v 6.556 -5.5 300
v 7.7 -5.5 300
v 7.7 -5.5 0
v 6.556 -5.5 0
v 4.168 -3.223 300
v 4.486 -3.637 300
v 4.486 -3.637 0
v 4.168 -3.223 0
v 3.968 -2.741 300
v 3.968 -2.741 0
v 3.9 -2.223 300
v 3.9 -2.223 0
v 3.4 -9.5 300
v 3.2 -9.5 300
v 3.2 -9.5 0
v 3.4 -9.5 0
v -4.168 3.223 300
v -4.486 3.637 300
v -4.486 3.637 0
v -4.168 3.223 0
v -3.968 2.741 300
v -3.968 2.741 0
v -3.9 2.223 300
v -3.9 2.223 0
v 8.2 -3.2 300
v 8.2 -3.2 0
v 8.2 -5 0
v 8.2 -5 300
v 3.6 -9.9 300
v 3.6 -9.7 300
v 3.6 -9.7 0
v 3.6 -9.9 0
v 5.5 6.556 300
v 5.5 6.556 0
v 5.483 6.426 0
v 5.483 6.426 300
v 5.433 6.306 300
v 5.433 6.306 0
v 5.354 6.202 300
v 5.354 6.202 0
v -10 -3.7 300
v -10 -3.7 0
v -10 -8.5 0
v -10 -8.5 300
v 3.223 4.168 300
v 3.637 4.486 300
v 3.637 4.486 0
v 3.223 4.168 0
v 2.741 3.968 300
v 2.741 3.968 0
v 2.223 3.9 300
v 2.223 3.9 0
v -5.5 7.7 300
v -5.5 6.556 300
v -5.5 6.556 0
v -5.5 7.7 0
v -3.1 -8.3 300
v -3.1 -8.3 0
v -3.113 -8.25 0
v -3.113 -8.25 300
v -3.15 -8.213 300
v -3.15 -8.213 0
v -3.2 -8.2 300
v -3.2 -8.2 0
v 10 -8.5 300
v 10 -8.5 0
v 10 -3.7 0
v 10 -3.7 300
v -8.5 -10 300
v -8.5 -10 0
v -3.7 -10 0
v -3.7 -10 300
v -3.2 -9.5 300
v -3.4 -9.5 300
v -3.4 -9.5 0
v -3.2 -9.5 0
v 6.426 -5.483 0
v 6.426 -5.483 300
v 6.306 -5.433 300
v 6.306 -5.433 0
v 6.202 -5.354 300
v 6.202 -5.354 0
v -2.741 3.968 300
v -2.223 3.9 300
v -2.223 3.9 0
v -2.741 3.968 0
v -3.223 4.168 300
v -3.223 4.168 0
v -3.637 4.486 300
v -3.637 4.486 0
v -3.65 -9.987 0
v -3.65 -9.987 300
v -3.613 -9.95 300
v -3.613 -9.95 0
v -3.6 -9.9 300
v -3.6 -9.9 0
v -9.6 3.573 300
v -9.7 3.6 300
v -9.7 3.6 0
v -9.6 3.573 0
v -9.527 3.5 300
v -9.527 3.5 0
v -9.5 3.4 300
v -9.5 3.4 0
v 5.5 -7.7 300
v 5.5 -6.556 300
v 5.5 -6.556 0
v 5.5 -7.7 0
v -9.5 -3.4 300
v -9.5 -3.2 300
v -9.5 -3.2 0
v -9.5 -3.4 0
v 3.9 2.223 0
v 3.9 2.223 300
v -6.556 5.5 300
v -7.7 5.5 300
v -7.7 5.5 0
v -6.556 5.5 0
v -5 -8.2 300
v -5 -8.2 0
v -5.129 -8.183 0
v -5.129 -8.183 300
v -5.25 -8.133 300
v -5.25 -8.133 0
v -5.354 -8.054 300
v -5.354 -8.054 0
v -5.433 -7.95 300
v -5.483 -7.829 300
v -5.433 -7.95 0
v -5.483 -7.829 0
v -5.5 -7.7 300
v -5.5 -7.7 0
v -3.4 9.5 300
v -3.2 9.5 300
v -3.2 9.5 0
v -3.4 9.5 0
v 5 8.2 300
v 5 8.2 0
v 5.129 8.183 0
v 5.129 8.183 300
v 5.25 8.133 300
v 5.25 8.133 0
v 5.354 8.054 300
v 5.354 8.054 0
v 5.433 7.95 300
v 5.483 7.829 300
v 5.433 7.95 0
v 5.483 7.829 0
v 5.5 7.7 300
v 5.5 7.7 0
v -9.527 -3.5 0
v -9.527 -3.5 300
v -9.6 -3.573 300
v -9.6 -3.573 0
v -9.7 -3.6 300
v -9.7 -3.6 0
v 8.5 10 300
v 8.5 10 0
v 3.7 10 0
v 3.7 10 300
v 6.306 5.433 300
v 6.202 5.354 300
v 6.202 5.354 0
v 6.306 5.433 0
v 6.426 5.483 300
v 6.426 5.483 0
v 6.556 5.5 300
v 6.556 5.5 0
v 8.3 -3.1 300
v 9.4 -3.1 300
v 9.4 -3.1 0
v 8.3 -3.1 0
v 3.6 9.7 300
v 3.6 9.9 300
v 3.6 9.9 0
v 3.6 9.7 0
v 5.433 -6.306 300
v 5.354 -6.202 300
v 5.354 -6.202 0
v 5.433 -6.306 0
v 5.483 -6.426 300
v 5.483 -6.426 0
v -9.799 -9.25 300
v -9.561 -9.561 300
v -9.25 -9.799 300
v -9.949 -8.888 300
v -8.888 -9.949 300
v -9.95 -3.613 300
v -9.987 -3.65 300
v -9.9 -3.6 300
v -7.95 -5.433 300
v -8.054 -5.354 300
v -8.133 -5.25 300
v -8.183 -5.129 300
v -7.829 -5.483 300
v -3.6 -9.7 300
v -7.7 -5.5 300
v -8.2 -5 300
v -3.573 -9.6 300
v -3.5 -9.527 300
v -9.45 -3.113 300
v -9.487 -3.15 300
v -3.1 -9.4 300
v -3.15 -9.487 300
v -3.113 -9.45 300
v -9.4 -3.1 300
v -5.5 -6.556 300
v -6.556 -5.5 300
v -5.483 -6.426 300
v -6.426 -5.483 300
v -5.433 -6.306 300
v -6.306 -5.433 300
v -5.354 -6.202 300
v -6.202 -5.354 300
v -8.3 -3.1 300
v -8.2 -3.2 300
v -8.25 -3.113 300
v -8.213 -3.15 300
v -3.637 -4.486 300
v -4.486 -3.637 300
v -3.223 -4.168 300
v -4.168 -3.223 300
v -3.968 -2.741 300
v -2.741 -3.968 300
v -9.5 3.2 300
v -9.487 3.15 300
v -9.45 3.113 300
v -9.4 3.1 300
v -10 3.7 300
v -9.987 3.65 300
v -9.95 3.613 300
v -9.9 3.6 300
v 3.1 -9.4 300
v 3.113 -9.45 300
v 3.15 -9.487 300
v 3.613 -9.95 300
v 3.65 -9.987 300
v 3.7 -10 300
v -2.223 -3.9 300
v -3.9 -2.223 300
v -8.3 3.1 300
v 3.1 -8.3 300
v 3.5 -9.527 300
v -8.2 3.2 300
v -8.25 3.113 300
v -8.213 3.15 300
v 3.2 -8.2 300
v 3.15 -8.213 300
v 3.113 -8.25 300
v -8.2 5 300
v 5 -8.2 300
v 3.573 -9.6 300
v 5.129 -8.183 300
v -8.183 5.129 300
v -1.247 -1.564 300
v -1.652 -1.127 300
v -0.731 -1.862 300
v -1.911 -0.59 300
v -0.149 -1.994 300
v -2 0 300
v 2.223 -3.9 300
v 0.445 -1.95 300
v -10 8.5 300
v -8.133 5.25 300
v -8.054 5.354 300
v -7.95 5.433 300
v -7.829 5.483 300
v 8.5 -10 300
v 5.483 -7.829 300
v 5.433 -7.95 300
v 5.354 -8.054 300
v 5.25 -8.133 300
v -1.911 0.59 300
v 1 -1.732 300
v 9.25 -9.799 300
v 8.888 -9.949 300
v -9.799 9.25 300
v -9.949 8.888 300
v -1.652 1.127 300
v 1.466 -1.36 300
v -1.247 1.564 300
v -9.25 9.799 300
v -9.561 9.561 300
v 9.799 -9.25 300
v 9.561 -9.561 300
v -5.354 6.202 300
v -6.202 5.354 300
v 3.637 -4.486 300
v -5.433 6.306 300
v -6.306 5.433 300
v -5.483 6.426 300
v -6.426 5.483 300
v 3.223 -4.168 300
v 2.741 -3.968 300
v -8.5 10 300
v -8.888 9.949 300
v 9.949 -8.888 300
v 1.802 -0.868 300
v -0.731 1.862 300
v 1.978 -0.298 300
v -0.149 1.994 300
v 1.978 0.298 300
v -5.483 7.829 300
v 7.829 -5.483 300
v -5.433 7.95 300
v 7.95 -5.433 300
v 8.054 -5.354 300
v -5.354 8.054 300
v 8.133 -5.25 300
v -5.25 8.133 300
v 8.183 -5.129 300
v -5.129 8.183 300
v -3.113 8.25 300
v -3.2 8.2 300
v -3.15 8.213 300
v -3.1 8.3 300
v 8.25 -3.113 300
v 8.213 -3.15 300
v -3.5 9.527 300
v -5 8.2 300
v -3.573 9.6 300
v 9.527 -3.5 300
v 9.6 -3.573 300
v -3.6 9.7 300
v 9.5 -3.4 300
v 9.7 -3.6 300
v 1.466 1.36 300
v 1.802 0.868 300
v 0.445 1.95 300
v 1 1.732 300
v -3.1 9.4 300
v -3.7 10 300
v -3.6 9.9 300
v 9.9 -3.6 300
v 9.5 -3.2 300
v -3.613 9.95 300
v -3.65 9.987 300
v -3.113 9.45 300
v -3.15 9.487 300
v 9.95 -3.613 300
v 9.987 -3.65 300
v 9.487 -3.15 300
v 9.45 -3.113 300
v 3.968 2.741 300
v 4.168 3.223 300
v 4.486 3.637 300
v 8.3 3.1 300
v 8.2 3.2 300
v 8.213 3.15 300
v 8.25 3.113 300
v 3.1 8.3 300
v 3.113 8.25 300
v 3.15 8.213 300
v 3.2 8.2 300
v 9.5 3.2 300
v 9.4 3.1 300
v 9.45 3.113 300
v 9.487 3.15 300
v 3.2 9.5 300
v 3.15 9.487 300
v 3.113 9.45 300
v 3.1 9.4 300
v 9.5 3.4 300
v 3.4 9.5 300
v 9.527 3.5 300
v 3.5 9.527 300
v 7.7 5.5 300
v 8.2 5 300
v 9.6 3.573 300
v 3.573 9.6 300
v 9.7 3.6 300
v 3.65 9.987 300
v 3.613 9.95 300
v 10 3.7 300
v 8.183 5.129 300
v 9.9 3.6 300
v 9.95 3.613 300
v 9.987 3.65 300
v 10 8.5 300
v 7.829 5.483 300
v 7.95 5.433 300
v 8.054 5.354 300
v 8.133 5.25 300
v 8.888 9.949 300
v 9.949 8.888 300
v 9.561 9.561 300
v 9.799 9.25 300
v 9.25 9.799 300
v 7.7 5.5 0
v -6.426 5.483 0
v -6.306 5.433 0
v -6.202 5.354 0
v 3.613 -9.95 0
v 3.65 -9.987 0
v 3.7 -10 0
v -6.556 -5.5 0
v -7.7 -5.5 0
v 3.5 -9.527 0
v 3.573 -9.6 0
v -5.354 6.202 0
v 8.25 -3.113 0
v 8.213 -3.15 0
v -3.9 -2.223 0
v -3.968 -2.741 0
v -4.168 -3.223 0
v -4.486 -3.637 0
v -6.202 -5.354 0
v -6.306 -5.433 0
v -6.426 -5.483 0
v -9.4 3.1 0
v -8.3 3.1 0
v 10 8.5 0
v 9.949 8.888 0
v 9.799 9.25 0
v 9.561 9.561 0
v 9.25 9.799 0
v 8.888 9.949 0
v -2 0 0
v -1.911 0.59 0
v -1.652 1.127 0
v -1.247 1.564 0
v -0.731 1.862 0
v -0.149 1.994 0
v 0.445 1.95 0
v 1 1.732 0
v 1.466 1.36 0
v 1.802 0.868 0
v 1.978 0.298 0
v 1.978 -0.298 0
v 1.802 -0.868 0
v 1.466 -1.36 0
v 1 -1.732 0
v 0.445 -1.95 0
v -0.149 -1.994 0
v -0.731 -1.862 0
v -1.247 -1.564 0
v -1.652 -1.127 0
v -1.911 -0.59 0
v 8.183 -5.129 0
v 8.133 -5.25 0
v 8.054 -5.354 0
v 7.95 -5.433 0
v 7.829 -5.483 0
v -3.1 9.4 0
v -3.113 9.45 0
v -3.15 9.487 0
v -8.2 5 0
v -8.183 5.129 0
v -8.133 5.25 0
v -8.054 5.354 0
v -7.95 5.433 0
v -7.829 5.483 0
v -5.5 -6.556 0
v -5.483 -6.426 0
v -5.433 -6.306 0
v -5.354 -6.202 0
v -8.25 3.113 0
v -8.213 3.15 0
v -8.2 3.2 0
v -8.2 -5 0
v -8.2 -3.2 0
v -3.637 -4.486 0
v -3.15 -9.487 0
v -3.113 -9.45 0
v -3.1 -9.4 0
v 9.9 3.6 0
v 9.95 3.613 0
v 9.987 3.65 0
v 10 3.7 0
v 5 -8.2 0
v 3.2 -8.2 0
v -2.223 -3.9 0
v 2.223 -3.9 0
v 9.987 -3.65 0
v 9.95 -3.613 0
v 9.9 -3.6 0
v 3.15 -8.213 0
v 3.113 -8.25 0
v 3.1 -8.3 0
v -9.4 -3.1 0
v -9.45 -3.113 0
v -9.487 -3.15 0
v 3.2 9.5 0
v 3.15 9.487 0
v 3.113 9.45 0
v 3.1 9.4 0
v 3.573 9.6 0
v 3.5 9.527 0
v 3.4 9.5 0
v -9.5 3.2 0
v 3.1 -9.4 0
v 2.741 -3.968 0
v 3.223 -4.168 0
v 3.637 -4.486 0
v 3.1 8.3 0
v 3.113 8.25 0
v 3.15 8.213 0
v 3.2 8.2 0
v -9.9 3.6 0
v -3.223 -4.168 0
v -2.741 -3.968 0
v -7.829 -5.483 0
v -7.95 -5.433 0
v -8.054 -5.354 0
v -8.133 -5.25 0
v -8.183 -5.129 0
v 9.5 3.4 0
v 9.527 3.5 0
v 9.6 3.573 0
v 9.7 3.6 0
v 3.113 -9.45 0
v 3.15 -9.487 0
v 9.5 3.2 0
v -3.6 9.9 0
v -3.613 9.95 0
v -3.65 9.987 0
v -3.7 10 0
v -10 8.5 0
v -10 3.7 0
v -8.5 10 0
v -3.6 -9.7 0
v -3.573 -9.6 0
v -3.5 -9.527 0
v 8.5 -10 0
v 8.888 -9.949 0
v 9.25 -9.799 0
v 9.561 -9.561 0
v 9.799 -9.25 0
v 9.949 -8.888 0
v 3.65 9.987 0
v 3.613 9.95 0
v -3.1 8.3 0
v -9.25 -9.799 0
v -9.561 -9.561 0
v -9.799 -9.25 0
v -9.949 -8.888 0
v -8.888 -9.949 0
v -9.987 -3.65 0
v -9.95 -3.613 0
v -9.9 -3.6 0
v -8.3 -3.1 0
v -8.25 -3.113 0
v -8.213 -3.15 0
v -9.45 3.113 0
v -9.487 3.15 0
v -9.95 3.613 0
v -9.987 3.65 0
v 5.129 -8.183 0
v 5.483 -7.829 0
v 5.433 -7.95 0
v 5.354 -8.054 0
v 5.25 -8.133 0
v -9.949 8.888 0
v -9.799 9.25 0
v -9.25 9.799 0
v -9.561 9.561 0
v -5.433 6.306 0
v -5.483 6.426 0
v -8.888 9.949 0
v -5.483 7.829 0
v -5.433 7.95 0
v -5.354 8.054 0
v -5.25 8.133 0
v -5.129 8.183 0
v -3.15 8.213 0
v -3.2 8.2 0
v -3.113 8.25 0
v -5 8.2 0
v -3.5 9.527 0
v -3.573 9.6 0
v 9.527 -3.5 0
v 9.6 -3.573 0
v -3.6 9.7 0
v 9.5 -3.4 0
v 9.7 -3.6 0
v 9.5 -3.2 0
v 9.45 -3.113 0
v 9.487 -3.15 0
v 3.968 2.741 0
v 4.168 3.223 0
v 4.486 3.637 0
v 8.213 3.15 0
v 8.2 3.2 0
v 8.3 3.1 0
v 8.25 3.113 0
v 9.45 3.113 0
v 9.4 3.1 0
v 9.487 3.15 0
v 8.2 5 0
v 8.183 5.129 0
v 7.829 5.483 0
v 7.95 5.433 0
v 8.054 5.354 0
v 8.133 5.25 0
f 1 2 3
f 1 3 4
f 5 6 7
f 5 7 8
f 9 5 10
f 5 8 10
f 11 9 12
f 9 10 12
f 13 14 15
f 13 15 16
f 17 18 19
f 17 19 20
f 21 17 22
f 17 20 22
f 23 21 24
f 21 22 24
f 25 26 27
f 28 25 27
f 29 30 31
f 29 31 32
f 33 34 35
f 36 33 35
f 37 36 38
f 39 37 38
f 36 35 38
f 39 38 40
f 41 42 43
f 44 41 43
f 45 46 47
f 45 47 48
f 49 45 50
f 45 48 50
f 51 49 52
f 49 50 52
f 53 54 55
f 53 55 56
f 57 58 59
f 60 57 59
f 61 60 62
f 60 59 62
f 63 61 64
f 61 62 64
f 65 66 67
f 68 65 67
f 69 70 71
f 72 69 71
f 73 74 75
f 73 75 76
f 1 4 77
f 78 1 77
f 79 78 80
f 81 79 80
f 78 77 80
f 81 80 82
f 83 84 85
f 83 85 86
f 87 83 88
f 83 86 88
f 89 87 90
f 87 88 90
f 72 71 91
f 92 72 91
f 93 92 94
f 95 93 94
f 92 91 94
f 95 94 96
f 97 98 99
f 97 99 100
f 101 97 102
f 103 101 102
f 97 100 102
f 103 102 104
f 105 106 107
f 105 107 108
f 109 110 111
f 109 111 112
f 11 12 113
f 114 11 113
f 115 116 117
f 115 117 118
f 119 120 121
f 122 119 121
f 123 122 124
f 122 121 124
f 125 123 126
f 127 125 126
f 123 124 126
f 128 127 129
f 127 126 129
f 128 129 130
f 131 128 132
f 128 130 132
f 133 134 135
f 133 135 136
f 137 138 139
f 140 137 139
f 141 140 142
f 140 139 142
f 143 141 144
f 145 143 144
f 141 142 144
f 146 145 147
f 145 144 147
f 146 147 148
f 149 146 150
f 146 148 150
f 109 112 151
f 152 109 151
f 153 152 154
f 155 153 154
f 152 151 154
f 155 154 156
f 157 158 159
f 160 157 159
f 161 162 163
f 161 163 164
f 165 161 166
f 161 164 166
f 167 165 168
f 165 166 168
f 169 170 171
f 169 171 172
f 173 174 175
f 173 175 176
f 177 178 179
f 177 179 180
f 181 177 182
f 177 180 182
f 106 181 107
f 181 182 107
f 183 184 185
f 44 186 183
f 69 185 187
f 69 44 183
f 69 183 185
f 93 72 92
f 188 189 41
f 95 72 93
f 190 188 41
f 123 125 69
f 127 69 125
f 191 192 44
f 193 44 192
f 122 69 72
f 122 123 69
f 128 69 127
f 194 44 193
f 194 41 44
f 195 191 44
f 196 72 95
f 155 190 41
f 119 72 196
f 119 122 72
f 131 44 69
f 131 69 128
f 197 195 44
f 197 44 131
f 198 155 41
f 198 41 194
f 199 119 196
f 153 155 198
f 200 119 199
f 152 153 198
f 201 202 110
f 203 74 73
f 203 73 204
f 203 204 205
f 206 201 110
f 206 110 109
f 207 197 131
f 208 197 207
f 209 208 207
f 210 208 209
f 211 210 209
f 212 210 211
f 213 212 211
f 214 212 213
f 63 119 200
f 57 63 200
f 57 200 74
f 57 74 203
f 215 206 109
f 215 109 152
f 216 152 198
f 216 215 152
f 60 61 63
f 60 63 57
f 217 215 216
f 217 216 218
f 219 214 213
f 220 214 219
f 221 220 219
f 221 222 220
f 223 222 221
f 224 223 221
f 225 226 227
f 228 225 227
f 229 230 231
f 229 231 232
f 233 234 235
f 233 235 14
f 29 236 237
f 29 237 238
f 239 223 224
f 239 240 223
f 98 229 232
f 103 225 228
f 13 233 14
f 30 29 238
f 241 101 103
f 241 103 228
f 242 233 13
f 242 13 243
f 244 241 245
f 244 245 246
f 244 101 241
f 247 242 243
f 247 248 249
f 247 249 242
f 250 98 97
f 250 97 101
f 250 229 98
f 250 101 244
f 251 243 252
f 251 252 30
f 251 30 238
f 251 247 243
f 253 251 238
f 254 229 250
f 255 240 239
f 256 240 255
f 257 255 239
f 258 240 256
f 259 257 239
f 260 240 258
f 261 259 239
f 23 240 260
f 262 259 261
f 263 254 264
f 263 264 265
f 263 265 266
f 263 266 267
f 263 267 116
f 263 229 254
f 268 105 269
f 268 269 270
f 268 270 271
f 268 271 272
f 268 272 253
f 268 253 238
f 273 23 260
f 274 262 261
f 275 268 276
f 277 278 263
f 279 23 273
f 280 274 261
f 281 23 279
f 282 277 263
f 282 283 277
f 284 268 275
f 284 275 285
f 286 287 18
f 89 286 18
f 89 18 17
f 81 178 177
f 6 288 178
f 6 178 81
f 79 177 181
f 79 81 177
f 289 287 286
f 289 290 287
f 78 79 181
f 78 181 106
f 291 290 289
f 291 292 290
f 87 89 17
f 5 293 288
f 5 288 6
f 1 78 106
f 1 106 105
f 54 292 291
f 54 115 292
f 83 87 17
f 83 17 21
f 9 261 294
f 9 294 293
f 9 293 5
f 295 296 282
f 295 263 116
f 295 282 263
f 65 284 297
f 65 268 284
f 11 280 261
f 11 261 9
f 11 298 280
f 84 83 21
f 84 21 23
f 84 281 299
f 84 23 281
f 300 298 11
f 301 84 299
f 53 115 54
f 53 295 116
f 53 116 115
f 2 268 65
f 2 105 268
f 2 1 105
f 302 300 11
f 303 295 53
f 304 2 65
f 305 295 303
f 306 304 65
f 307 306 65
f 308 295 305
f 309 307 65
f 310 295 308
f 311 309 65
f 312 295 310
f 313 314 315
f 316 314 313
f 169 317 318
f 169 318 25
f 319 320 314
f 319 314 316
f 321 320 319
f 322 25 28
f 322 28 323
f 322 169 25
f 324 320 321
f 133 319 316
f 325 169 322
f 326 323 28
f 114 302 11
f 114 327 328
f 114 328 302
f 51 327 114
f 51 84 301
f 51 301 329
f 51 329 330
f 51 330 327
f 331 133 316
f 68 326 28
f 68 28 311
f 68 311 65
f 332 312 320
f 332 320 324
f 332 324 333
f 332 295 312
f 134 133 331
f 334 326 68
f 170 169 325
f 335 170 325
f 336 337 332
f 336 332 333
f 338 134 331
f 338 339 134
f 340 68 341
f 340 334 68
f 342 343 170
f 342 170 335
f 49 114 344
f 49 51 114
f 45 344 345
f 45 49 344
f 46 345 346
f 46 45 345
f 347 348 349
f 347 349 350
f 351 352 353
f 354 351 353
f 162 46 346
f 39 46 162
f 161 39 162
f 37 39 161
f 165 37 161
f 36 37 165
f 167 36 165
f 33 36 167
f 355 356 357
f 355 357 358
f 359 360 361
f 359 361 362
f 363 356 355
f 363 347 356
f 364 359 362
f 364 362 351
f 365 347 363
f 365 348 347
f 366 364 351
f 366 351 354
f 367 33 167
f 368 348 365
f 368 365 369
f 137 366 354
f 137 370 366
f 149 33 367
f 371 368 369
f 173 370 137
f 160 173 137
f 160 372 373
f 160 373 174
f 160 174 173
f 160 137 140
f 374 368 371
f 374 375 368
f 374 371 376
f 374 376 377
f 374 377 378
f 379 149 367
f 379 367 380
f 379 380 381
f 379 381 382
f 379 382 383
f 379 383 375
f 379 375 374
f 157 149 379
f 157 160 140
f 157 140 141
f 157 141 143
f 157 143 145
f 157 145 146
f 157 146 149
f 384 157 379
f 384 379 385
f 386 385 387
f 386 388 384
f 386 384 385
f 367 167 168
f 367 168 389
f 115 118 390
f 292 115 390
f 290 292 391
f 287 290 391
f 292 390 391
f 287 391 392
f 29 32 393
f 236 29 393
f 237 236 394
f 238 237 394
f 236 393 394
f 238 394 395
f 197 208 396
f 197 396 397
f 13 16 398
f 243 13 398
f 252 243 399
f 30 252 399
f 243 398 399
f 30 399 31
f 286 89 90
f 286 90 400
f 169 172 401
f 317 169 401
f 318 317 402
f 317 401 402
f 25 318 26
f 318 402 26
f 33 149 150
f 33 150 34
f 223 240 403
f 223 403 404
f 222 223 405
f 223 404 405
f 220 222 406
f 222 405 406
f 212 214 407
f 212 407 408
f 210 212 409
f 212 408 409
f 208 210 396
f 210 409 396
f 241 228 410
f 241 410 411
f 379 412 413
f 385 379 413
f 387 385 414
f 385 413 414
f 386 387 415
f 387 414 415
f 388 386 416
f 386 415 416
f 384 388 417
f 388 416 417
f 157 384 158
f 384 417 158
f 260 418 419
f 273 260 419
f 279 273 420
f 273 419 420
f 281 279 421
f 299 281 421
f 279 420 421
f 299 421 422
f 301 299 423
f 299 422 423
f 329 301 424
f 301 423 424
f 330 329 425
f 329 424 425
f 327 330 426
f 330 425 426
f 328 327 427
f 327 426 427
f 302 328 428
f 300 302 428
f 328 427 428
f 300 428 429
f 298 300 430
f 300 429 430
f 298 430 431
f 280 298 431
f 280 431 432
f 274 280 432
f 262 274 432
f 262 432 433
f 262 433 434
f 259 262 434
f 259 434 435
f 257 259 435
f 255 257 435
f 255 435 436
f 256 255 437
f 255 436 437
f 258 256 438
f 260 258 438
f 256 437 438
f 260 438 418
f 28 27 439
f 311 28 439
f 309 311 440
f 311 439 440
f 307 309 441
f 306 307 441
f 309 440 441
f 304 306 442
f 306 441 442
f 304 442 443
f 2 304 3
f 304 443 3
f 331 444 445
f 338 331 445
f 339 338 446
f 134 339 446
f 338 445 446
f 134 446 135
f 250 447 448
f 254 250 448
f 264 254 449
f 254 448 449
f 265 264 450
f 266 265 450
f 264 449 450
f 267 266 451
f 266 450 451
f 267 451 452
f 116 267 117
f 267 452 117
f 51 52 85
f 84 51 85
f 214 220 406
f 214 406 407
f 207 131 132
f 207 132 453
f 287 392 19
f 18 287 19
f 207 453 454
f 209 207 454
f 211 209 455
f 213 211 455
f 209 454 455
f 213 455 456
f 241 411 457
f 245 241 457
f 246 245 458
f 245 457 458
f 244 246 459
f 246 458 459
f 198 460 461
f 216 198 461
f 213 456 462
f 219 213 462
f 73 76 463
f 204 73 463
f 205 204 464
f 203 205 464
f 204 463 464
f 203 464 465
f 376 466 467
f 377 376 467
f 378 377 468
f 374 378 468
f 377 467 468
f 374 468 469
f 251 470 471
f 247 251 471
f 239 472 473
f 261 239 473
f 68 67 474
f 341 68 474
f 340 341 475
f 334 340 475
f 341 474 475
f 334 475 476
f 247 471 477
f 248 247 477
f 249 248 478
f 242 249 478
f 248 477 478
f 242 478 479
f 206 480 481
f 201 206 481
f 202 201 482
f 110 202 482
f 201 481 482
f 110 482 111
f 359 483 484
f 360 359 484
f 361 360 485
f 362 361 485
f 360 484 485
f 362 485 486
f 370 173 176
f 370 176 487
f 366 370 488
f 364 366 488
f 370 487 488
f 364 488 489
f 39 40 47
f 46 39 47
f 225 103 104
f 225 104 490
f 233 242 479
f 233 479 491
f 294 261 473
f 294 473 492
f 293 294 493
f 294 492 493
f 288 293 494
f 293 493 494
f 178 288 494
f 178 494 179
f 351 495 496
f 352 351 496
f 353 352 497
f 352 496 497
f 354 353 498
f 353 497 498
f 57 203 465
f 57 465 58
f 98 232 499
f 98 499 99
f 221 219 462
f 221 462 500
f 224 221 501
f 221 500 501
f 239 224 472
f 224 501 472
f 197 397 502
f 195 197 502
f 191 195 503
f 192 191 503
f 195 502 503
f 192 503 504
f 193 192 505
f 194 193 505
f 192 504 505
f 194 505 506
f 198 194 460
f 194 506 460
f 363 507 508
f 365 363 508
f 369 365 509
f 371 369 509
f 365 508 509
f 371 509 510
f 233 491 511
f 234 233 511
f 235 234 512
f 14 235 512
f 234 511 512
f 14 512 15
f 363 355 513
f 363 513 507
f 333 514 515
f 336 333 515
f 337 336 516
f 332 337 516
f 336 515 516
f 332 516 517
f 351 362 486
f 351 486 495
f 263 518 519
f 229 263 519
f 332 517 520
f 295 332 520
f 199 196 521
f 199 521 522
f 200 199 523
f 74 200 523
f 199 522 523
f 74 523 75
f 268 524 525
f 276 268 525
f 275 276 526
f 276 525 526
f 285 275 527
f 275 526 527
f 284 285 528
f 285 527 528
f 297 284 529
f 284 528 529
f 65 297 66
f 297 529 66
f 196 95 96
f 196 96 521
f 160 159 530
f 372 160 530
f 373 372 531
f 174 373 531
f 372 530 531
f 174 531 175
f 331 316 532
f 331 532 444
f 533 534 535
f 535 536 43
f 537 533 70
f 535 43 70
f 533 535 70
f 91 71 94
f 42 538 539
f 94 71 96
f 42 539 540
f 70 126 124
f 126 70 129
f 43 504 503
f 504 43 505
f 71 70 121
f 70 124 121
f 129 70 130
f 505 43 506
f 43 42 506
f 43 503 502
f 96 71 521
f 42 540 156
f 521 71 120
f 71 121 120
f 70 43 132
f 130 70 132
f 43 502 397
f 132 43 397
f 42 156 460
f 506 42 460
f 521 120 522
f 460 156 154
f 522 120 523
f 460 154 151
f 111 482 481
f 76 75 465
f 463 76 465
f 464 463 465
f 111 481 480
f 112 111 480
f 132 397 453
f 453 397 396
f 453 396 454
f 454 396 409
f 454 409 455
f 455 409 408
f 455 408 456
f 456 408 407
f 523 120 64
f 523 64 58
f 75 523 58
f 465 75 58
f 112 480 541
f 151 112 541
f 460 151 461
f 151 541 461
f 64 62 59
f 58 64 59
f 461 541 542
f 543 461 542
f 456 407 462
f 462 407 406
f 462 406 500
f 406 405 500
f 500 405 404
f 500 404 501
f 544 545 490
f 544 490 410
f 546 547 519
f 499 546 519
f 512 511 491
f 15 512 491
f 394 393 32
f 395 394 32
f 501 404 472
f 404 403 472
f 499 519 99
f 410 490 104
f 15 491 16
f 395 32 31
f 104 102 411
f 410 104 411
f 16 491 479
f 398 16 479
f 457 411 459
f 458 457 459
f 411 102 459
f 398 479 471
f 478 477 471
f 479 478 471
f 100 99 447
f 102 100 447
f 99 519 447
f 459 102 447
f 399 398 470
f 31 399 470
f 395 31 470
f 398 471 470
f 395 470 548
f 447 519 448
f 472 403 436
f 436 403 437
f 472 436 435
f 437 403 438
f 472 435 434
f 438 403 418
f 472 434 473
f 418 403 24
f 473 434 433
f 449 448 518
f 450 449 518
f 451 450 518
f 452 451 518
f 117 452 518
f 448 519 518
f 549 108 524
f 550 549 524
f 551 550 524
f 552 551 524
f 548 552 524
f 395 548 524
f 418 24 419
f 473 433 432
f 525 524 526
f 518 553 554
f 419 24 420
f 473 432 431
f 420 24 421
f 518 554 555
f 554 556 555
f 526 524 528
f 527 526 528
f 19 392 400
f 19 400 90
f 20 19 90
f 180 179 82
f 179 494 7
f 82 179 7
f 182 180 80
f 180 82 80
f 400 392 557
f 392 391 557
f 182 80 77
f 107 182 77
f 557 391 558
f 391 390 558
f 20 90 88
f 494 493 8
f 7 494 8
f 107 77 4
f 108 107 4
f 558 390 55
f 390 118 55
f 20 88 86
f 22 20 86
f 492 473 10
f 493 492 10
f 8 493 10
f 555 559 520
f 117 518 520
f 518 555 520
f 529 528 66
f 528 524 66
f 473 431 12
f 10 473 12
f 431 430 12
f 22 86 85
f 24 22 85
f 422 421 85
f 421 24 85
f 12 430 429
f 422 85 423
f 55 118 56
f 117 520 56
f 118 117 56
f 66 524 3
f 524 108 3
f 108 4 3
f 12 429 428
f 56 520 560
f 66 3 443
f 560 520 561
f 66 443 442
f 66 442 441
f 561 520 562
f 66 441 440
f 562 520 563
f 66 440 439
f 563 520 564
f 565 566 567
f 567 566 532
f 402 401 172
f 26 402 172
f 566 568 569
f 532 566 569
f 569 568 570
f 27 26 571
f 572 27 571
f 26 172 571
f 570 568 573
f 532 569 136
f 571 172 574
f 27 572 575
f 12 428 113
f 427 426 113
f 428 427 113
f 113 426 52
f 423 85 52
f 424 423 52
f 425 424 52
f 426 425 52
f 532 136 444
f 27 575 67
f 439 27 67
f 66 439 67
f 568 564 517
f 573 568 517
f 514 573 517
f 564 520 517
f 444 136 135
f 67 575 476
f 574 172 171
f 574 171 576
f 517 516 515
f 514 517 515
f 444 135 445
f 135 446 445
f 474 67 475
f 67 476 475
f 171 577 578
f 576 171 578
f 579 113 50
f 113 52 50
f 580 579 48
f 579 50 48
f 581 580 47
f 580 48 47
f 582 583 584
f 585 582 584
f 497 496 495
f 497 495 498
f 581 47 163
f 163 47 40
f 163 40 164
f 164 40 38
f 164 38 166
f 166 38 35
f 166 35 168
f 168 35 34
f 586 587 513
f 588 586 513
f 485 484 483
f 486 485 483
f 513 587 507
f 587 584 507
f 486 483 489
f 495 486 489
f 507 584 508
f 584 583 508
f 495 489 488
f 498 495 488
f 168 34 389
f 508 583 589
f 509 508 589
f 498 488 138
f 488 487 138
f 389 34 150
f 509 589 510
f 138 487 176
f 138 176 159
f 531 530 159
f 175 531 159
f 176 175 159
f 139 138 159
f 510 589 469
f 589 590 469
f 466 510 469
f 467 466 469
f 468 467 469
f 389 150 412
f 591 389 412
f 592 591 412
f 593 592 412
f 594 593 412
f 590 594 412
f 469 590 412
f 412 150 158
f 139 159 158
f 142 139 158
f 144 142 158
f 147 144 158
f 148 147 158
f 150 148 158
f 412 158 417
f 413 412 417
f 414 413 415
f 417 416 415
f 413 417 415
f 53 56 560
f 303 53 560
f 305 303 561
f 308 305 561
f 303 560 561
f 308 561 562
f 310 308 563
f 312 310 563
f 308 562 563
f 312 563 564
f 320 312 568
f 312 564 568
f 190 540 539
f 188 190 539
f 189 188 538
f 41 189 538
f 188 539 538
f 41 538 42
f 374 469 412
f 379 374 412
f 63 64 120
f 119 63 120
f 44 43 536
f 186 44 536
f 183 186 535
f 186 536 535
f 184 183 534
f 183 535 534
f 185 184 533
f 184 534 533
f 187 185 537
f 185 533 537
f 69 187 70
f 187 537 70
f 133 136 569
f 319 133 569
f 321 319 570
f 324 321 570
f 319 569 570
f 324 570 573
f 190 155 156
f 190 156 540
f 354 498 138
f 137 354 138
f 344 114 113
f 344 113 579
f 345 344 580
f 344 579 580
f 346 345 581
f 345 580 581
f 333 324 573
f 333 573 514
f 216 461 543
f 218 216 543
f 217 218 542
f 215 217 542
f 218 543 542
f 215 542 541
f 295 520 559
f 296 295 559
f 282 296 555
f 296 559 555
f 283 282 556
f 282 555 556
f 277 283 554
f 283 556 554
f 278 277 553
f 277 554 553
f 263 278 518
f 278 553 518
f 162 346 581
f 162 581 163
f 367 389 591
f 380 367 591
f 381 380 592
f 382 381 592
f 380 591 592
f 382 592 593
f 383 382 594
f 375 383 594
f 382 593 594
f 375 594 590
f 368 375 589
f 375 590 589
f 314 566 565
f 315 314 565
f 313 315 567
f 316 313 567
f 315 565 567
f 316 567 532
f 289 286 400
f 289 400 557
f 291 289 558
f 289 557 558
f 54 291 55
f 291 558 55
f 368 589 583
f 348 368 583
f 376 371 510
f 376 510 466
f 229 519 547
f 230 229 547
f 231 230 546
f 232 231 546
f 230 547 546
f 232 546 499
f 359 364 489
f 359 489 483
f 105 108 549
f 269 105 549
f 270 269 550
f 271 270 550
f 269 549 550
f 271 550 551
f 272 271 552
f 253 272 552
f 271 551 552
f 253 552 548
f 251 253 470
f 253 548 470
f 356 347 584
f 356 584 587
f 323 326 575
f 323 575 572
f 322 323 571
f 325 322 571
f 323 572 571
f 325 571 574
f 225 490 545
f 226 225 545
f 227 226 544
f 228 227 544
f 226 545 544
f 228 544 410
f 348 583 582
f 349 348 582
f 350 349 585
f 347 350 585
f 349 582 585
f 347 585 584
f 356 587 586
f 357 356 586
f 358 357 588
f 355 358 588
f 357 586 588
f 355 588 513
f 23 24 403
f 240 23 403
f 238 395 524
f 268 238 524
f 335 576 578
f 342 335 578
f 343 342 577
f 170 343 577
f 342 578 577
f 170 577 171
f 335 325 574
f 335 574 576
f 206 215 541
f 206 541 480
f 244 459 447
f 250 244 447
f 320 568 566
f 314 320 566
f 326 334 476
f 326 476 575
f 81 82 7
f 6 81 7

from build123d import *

# Parameters (mm, degrees)
BOSS_EXTRU_2_DEPTH      = 300
ESQUISSE3_R             = 2
ENL_V_MAT_EXTRU_1_DEPTH = 300


with BuildPart() as part:
    # Esquisse2 → Boss.-Extru.2 (new body)
    with BuildSketch(Plane.XY):
        with BuildLine():
            Line((10, -8.5), (10, -3.7))
            ThreePointArc((10, -3.7), (9.970710687, -3.629289335), (9.900000029, -3.600000004))
            Line((9.900000029, -3.600000004), (9.700000029, -3.600000004))
            ThreePointArc((9.700000029, -3.600000004), (9.558578673, -3.54142136), (9.500000029, -3.400000004))
            Line((9.500000029, -3.400000004), (9.500000029, -3.200000004))
            ThreePointArc((9.500000029, -3.200000004), (9.470710707, -3.129289326), (9.400000029, -3.100000004))
            Line((9.400000029, -3.100000004), (8.300000029, -3.100000004))
            ThreePointArc((8.300000029, -3.100000004), (8.229289342, -3.129289335), (8.200000029, -3.200000029))
            Line((8.200000029, -3.200000029), (8.200000029, -5.000000029))
            ThreePointArc((8.200000029, -5.000000029), (8.053553419, -5.353553419), (7.700000029, -5.500000029))
            Line((7.700000029, -5.500000029), (6.555634947, -5.500000029))
            ThreePointArc((6.555634947, -5.500000029), (6.364293231, -5.461939795), (6.202081557, -5.353553419))
            Line((6.202081557, -5.353553419), (4.485786438, -3.6372583))
            ThreePointArc((4.485786438, -3.6372583), (4.052240935, -2.988411603), (3.9, -2.223044738))
            Line((3.9, -2.223044738), (3.9, 2.223044738))
            ThreePointArc((3.9, 2.223044738), (4.052240935, 2.988411603), (4.485786438, 3.6372583))
            Line((4.485786438, 3.6372583), (6.202081528, 5.353553391))
            ThreePointArc((6.202081528, 5.353553391), (6.364293202, 5.461939766), (6.555634919, 5.5))
            Line((6.555634919, 5.5), (7.7, 5.5))
            ThreePointArc((7.7, 5.5), (8.053553391, 5.353553391), (8.2, 5))
            Line((8.2, 5), (8.2, 3.2))
            ThreePointArc((8.2, 3.2), (8.229289322, 3.129289322), (8.3, 3.1))
            Line((8.3, 3.1), (9.4, 3.1))
            ThreePointArc((9.4, 3.1), (9.470710678, 3.129289322), (9.5, 3.2))
            Line((9.5, 3.2), (9.5, 3.4))
            ThreePointArc((9.5, 3.4), (9.558578644, 3.541421356), (9.7, 3.6))
            Line((9.7, 3.6), (9.9, 3.6))
            ThreePointArc((9.9, 3.6), (9.970710678, 3.629289322), (10, 3.7))
            Line((10, 3.7), (10, 8.5))
            ThreePointArc((10, 8.5), (9.560660172, 9.560660172), (8.5, 10))
            Line((8.5, 10), (3.7, 10))
            ThreePointArc((3.7, 10), (3.629289335, 9.970710687), (3.600000004, 9.900000029))
            Line((3.600000004, 9.900000029), (3.600000004, 9.700000029))
            ThreePointArc((3.600000004, 9.700000029), (3.54142136, 9.558578673), (3.400000004, 9.500000029))
            Line((3.400000004, 9.500000029), (3.200000004, 9.500000029))
            ThreePointArc((3.200000004, 9.500000029), (3.129289326, 9.470710707), (3.100000004, 9.400000029))
            Line((3.100000004, 9.400000029), (3.100000004, 8.300000029))
            ThreePointArc((3.100000004, 8.300000029), (3.129289335, 8.229289342), (3.200000029, 8.200000029))
            Line((3.200000029, 8.200000029), (5.000000029, 8.200000029))
            ThreePointArc((5.000000029, 8.200000029), (5.353553419, 8.053553419), (5.500000029, 7.700000029))
            Line((5.500000029, 7.700000029), (5.500000029, 6.555634947))
            ThreePointArc((5.500000029, 6.555634947), (5.461939795, 6.364293231), (5.353553419, 6.202081557))
            Line((5.353553419, 6.202081557), (3.6372583, 4.485786438))
            ThreePointArc((3.6372583, 4.485786438), (2.988411603, 4.052240935), (2.223044738, 3.9))
            Line((2.223044738, 3.9), (-2.223044738, 3.9))
            ThreePointArc((-2.223044738, 3.9), (-2.988411603, 4.052240935), (-3.6372583, 4.485786438))
            Line((-3.6372583, 4.485786438), (-5.353553391, 6.202081528))
            ThreePointArc((-5.353553391, 6.202081528), (-5.461939766, 6.364293202), (-5.5, 6.555634919))
            Line((-5.5, 6.555634919), (-5.5, 7.7))
            ThreePointArc((-5.5, 7.7), (-5.353553391, 8.053553391), (-5, 8.2))
            Line((-5, 8.2), (-3.2, 8.2))
            ThreePointArc((-3.2, 8.2), (-3.129289322, 8.229289322), (-3.1, 8.3))
            Line((-3.1, 8.3), (-3.1, 9.4))
            ThreePointArc((-3.1, 9.4), (-3.129289322, 9.470710678), (-3.2, 9.5))
            Line((-3.2, 9.5), (-3.4, 9.5))
            ThreePointArc((-3.4, 9.5), (-3.541421356, 9.558578644), (-3.6, 9.7))
            Line((-3.6, 9.7), (-3.6, 9.9))
            ThreePointArc((-3.6, 9.9), (-3.629289322, 9.970710678), (-3.7, 10))
            Line((-3.7, 10), (-8.5, 10))
            ThreePointArc((-8.5, 10), (-9.560660172, 9.560660172), (-10, 8.5))
            Line((-10, 8.5), (-10, 3.7))
            ThreePointArc((-10, 3.7), (-9.970710687, 3.629289335), (-9.900000029, 3.600000004))
            Line((-9.900000029, 3.600000004), (-9.700000029, 3.600000004))
            ThreePointArc((-9.700000029, 3.600000004), (-9.558578673, 3.54142136), (-9.500000029, 3.400000004))
            Line((-9.500000029, 3.400000004), (-9.500000029, 3.200000004))
            ThreePointArc((-9.500000029, 3.200000004), (-9.470710707, 3.129289326), (-9.400000029, 3.100000004))
            Line((-9.400000029, 3.100000004), (-8.300000029, 3.100000004))
            ThreePointArc((-8.300000029, 3.100000004), (-8.229289342, 3.129289335), (-8.200000029, 3.200000029))
            Line((-8.200000029, 3.200000029), (-8.200000029, 5.000000029))
            ThreePointArc((-8.200000029, 5.000000029), (-8.053553419, 5.353553419), (-7.700000029, 5.500000029))
            Line((-7.700000029, 5.500000029), (-6.555634947, 5.500000029))
            ThreePointArc((-6.555634947, 5.500000029), (-6.364293231, 5.461939795), (-6.202081557, 5.353553419))
            Line((-6.202081557, 5.353553419), (-4.485786438, 3.6372583))
            ThreePointArc((-4.485786438, 3.6372583), (-4.052240935, 2.988411603), (-3.9, 2.223044738))
            Line((-3.9, 2.223044738), (-3.9, -2.223044738))
            ThreePointArc((-3.9, -2.223044738), (-4.052240935, -2.988411603), (-4.485786438, -3.6372583))
            Line((-4.485786438, -3.6372583), (-6.202081528, -5.353553391))
            ThreePointArc((-6.202081528, -5.353553391), (-6.364293202, -5.461939766), (-6.555634919, -5.5))
            Line((-6.555634919, -5.5), (-7.7, -5.5))
            ThreePointArc((-7.7, -5.5), (-8.053553391, -5.353553391), (-8.2, -5))
            Line((-8.2, -5), (-8.2, -3.2))
            ThreePointArc((-8.2, -3.2), (-8.229289322, -3.129289322), (-8.3, -3.1))
            Line((-8.3, -3.1), (-9.4, -3.1))
            ThreePointArc((-9.4, -3.1), (-9.470710678, -3.129289322), (-9.5, -3.2))
            Line((-9.5, -3.2), (-9.5, -3.4))
            ThreePointArc((-9.5, -3.4), (-9.558578644, -3.541421356), (-9.7, -3.6))
            Line((-9.7, -3.6), (-9.9, -3.6))
            ThreePointArc((-9.9, -3.6), (-9.970710678, -3.629289322), (-10, -3.7))
            Line((-10, -3.7), (-10, -8.5))
            ThreePointArc((-10, -8.5), (-9.560660172, -9.560660172), (-8.5, -10))
            Line((-8.5, -10), (-3.7, -10))
            ThreePointArc((-3.7, -10), (-3.629289335, -9.970710687), (-3.600000004, -9.900000029))
            Line((-3.600000004, -9.900000029), (-3.600000004, -9.700000029))
            ThreePointArc((-3.600000004, -9.700000029), (-3.54142136, -9.558578673), (-3.400000004, -9.500000029))
            Line((-3.400000004, -9.500000029), (-3.200000004, -9.500000029))
            ThreePointArc((-3.200000004, -9.500000029), (-3.129289326, -9.470710707), (-3.100000004, -9.400000029))
            Line((-3.100000004, -9.400000029), (-3.100000004, -8.300000029))
            ThreePointArc((-3.100000004, -8.300000029), (-3.129289335, -8.229289342), (-3.200000029, -8.200000029))
            Line((-3.200000029, -8.200000029), (-5.000000029, -8.200000029))
            ThreePointArc((-5.000000029, -8.200000029), (-5.353553419, -8.053553419), (-5.500000029, -7.700000029))
            Line((-5.500000029, -7.700000029), (-5.500000029, -6.555634947))
            ThreePointArc((-5.500000029, -6.555634947), (-5.461939795, -6.364293231), (-5.353553419, -6.202081557))
            Line((-5.353553419, -6.202081557), (-3.6372583, -4.485786438))
            ThreePointArc((-3.6372583, -4.485786438), (-2.988411603, -4.052240935), (-2.223044738, -3.9))
            Line((-2.223044738, -3.9), (2.223044738, -3.9))
            ThreePointArc((2.223044738, -3.9), (2.988411603, -4.052240935), (3.6372583, -4.485786438))
            Line((3.6372583, -4.485786438), (5.353553391, -6.202081528))
            ThreePointArc((5.353553391, -6.202081528), (5.461939766, -6.364293202), (5.5, -6.555634919))
            Line((5.5, -6.555634919), (5.5, -7.7))
            ThreePointArc((5.5, -7.7), (5.353553391, -8.053553391), (5, -8.2))
            Line((5, -8.2), (3.2, -8.2))
            ThreePointArc((3.2, -8.2), (3.129289322, -8.229289322), (3.1, -8.3))
            Line((3.1, -8.3), (3.1, -9.4))
            ThreePointArc((3.1, -9.4), (3.129289322, -9.470710678), (3.2, -9.5))
            Line((3.2, -9.5), (3.4, -9.5))
            ThreePointArc((3.4, -9.5), (3.541421356, -9.558578644), (3.6, -9.7))
            Line((3.6, -9.7), (3.6, -9.9))
            ThreePointArc((3.6, -9.9), (3.629289322, -9.970710678), (3.7, -10))
            Line((3.7, -10), (8.5, -10))
            ThreePointArc((8.5, -10), (9.560660172, -9.560660172), (10, -8.5))
        make_face()
    extrude(amount=BOSS_EXTRU_2_DEPTH)

    # Esquisse3 → Enlèv. mat.-Extru.1 (cut)
    with BuildSketch(Plane(origin=(0, 0, 0), x_dir=(-1, 0, 0), z_dir=(0, 0, -1))):
        Circle(ESQUISSE3_R)
    extrude(amount=-ENL_V_MAT_EXTRU_1_DEPTH, mode=Mode.SUBTRACT)


solid = part.part
